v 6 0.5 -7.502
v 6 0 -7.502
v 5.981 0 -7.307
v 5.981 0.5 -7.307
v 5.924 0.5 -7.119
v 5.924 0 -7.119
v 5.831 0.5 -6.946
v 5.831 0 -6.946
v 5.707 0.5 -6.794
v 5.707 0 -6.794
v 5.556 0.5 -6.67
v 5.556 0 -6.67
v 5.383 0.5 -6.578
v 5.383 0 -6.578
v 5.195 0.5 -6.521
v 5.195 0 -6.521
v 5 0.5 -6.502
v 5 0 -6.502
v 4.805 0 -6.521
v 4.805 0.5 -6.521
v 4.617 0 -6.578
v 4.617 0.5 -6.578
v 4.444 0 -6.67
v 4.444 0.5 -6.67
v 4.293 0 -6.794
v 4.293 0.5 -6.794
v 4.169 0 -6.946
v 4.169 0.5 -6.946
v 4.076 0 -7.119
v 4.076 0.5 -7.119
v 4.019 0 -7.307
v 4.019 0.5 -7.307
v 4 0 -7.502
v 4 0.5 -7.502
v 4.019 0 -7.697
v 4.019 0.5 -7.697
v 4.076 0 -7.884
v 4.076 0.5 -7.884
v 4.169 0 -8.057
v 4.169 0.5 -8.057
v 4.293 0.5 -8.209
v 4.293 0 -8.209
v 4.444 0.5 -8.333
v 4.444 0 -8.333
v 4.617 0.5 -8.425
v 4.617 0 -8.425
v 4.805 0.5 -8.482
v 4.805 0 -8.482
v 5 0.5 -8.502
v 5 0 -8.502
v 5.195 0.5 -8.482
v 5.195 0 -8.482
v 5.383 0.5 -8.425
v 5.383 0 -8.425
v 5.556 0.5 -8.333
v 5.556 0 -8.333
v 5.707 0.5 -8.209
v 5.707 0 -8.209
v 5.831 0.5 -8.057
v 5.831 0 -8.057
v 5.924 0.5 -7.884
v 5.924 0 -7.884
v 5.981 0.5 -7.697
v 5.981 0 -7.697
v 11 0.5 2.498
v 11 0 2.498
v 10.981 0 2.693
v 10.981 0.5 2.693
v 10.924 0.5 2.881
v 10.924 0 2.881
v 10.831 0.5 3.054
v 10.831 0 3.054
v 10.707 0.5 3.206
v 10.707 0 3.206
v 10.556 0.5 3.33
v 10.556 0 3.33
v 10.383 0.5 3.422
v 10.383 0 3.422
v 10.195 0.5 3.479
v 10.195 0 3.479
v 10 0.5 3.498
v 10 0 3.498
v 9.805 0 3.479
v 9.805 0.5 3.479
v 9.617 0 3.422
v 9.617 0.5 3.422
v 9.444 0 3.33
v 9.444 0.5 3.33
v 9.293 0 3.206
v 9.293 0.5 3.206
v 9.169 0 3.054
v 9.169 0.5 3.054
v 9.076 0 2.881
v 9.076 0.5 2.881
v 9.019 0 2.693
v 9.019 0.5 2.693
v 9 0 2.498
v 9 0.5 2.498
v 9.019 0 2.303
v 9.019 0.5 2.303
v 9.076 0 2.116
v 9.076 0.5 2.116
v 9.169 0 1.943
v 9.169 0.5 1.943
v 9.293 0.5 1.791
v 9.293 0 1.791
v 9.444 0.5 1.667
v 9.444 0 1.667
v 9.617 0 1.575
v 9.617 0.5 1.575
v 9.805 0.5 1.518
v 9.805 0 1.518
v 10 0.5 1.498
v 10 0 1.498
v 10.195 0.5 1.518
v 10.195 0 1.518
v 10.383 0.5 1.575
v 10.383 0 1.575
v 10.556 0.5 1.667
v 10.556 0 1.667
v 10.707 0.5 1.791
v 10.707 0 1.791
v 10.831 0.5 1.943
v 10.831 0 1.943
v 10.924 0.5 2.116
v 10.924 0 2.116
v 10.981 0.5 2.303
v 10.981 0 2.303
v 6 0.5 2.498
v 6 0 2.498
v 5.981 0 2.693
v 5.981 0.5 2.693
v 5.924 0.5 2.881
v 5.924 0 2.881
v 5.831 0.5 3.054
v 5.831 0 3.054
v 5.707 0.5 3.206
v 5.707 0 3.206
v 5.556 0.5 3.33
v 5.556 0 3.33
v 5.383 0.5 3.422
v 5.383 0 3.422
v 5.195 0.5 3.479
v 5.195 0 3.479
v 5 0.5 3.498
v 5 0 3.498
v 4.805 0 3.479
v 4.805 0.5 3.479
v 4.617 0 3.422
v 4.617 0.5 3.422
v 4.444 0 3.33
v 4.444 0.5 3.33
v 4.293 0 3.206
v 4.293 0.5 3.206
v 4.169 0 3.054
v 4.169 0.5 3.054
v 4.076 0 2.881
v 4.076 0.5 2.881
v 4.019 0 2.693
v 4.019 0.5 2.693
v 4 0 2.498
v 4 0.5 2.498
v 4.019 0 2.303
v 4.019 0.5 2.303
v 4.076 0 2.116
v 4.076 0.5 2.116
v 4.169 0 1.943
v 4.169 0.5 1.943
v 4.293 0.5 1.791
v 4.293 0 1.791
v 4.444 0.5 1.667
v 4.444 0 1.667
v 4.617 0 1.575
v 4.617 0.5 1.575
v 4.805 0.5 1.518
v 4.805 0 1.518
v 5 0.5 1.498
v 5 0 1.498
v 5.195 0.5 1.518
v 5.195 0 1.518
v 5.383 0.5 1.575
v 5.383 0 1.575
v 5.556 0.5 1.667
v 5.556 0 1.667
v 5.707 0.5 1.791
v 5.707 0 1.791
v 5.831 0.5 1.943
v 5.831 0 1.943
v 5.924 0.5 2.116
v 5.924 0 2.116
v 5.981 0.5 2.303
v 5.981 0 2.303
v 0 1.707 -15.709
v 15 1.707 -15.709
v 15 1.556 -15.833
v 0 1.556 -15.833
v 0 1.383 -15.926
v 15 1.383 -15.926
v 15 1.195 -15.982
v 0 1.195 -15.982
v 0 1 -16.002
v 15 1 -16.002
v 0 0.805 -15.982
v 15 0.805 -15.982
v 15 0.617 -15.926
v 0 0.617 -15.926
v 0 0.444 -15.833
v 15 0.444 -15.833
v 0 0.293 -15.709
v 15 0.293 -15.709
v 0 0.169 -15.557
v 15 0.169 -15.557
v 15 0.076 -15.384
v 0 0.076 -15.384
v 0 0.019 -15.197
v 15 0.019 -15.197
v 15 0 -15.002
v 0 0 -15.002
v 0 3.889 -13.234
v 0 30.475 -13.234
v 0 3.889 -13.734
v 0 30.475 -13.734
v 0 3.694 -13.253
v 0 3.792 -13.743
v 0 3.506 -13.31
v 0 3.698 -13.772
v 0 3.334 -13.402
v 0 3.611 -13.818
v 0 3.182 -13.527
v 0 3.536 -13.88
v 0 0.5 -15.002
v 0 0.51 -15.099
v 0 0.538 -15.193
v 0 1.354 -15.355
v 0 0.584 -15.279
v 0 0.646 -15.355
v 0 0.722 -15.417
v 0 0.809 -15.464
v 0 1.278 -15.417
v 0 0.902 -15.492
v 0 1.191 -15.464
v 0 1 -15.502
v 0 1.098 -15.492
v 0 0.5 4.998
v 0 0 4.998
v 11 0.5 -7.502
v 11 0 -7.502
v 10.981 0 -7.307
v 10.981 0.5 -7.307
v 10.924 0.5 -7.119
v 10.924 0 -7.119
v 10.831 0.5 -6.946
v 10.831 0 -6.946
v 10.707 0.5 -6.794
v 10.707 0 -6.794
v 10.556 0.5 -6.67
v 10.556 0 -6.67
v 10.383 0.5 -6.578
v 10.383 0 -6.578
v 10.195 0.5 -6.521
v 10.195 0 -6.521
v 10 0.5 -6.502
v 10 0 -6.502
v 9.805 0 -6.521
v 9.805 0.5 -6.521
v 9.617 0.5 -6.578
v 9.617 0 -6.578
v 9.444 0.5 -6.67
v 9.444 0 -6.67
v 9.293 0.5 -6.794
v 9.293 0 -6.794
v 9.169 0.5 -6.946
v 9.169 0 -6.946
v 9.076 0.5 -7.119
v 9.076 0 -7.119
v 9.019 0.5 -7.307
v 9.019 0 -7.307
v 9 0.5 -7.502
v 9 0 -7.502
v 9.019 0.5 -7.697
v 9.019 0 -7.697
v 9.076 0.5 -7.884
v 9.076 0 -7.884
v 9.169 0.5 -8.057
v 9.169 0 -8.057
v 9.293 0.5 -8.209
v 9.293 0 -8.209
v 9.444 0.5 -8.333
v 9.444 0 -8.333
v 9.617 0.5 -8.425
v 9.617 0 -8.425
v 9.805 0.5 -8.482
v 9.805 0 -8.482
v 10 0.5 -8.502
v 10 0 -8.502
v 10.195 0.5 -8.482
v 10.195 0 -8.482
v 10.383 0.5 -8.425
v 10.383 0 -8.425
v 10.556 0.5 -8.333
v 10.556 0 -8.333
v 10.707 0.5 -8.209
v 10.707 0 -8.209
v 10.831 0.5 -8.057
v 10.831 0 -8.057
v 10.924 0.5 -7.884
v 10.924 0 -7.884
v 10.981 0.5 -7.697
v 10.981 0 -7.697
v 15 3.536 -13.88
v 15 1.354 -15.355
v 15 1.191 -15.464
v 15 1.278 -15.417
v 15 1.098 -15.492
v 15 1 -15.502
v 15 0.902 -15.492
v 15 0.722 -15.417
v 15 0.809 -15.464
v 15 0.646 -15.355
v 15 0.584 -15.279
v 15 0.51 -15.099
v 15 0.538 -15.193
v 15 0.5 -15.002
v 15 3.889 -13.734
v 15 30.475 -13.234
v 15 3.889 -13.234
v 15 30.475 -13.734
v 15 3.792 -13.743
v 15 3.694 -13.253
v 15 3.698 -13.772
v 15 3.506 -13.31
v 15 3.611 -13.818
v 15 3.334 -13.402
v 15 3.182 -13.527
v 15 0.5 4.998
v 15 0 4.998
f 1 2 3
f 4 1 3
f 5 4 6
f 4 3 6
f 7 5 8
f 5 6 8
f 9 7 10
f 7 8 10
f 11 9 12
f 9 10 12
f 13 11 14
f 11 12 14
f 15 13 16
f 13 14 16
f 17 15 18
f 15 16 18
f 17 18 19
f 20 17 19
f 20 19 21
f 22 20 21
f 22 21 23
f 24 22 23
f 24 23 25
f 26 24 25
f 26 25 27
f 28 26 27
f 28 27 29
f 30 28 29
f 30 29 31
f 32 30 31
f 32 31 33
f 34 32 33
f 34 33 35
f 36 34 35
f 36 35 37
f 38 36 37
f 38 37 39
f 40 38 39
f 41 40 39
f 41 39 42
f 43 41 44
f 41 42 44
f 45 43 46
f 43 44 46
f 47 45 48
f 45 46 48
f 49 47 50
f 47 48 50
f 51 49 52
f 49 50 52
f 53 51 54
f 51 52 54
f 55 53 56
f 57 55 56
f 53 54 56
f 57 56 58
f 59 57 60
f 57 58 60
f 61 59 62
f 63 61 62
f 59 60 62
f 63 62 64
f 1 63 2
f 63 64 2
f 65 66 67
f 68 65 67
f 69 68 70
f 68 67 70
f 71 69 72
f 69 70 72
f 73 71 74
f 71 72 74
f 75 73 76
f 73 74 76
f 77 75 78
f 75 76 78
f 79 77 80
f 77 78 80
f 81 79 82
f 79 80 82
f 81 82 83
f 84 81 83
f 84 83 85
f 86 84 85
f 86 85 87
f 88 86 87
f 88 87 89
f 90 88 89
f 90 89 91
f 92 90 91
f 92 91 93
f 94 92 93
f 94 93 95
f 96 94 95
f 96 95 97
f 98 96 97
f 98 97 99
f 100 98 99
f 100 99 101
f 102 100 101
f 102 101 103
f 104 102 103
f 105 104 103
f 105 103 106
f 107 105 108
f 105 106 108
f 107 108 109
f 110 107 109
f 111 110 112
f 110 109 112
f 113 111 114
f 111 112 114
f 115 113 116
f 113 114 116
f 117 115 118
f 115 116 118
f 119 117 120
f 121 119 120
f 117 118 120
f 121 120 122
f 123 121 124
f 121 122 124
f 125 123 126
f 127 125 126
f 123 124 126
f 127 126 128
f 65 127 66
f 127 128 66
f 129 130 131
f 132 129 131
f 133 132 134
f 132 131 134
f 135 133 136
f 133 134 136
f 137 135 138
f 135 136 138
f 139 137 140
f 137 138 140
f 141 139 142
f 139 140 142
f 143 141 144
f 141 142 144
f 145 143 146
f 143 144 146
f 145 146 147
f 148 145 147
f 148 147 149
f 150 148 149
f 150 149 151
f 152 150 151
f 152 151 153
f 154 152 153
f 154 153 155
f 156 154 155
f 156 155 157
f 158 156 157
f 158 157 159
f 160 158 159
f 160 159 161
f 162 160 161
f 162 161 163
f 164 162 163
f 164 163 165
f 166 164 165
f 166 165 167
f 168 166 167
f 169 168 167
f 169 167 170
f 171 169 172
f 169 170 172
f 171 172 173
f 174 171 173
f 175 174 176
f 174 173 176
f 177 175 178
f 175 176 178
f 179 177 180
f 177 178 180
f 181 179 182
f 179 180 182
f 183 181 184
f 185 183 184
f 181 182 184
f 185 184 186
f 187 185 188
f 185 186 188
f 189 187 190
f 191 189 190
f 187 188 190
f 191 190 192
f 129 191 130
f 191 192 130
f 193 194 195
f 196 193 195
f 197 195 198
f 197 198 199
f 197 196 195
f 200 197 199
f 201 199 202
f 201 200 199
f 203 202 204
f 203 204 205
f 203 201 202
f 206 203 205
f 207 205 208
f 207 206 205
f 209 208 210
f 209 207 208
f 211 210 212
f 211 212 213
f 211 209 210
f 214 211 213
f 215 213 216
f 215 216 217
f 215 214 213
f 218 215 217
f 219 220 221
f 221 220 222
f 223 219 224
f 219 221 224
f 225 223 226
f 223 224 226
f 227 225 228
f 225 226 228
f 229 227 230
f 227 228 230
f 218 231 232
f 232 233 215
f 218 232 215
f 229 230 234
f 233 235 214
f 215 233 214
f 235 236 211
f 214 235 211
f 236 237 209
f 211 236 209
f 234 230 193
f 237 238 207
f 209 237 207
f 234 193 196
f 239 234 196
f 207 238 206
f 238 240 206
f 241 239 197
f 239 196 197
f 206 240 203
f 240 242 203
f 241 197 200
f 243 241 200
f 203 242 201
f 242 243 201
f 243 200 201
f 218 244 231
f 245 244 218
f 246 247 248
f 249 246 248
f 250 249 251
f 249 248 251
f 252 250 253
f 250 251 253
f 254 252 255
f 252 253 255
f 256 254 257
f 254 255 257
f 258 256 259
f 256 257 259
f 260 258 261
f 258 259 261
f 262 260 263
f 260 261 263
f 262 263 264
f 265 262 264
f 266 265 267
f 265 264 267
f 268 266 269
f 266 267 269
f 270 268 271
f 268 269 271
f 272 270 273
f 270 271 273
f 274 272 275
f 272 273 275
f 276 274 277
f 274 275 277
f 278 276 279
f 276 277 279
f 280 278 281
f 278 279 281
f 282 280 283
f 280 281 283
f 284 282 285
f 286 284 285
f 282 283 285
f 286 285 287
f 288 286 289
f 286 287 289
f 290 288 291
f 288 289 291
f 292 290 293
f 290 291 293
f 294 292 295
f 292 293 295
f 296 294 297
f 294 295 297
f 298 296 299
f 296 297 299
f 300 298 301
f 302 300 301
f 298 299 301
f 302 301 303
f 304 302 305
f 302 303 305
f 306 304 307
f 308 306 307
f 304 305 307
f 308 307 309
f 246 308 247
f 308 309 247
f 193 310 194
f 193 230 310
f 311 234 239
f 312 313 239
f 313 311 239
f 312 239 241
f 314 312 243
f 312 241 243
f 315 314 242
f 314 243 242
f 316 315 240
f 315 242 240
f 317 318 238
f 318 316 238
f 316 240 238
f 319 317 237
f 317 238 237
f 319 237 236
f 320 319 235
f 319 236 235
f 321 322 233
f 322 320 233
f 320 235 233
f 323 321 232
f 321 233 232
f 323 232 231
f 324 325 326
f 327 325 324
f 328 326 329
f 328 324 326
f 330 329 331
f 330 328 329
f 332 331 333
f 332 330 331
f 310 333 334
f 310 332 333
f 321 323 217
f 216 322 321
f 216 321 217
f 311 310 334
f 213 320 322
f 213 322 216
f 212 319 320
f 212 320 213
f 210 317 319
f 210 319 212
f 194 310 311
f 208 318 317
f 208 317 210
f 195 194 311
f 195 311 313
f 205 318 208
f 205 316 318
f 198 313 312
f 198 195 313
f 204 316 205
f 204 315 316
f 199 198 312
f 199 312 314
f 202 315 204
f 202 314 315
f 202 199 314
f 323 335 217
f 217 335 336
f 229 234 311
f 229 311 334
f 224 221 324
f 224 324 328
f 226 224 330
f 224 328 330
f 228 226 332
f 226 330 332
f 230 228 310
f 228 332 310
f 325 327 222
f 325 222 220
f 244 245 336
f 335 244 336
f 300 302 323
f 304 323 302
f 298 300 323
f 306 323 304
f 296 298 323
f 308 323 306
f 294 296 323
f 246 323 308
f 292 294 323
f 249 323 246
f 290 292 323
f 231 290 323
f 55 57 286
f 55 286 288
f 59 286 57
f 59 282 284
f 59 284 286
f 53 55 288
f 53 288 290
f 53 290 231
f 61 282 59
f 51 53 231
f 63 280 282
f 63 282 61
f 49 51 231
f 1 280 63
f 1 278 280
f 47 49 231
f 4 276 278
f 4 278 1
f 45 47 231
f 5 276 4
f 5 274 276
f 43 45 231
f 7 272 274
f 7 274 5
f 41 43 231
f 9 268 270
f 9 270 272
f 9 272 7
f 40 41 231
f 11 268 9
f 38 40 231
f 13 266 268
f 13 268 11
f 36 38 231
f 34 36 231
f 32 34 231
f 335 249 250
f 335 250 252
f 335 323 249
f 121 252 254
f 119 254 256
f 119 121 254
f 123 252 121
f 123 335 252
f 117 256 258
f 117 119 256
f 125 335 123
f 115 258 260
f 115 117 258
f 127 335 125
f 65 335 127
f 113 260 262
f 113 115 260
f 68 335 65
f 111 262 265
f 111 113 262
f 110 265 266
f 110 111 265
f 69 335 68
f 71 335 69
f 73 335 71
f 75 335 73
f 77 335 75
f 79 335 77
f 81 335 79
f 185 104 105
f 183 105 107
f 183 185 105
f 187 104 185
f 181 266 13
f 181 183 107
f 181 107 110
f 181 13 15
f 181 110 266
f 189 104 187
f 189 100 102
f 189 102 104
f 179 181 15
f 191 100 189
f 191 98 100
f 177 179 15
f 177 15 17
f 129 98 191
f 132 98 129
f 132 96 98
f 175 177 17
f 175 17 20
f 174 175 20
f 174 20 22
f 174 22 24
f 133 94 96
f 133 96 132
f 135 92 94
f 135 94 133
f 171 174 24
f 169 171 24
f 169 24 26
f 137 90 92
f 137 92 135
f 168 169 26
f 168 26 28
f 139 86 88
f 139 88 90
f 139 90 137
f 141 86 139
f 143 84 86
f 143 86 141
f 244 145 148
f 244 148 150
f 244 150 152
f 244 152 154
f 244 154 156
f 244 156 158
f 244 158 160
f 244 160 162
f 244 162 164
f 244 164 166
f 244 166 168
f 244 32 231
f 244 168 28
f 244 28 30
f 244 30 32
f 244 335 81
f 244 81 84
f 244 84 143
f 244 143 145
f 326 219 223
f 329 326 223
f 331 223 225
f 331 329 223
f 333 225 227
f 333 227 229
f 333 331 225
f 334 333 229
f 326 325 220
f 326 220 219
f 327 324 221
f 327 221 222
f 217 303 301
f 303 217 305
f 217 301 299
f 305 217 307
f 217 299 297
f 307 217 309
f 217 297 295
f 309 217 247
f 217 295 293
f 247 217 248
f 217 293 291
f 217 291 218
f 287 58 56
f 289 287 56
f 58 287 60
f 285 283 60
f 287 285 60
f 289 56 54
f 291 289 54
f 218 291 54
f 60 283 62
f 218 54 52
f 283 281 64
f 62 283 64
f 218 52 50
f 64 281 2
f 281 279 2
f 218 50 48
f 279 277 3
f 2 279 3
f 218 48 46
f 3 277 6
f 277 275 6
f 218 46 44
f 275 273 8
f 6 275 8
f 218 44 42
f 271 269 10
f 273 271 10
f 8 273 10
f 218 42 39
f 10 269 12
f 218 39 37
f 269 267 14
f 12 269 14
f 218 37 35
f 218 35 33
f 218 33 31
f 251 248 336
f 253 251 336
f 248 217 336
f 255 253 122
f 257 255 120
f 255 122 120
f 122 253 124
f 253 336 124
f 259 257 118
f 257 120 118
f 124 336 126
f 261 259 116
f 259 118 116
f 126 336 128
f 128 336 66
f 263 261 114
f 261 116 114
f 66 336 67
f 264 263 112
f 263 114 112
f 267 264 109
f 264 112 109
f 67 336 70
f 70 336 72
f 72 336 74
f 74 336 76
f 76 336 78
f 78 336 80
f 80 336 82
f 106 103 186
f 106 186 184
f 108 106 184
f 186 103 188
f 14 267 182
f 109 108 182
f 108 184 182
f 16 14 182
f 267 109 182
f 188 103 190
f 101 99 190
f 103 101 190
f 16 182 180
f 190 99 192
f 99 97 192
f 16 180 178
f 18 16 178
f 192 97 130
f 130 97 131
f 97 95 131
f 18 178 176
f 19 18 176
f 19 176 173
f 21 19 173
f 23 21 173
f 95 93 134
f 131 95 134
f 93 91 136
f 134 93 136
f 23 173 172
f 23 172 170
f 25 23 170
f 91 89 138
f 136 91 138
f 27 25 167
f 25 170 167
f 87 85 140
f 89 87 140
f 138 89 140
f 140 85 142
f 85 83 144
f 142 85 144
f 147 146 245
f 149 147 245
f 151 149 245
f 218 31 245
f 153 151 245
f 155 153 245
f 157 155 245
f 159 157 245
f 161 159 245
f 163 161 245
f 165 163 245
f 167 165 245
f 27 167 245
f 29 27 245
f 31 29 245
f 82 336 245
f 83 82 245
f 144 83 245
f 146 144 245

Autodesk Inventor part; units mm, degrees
ref_plane "YZ Plane" through (0, 0, 0) normal (1, 0, 0) x (0, 1, 0)
ref_plane "XZ Plane" through (0, 0, 0) normal (0, 1, 0) x (-1, 0, 0)
ref_plane "XY Plane" through (0, 0, 0) normal (0, 0, 1) x (1, 0, 0)
sketch "Sketch1" plane through (0, 0, 0) normal (0, 1, 0) x (-1, 0, 0)
  line L0 (0, 4.9984) -> (-15, 4.9984)
  line L1 (-15, 4.9984) -> (-15, -15.0016)
  line L2 (-15, -15.0016) -> (0, -15.0016)
  line L3 (0, -15.0016) -> (0, 4.9984)
  dimension "d0" = 15
  dimension "d1" = 20
extrude "Plate1" add sketch "Sketch1" along normal blind 0.5
sketch "Sketch2" plane through (0, 1.3536, -15.3552) normal (0, 0.7071068, -0.7071068) x (-1, 0, 0)
  line L0 (-15, 0) -> (0, 0)
  line L1 (0, 0) -> (0, 2.5858)
  line L2 (0, 2.5858) -> (-15, 2.5858)
  line L3 (-15, 2.5858) -> (-15, 0)
edge flange "Flange1" height 5 angle 135 thickness 0.5 bend radius 0.5 thickness toward (0, 0.7071068, -0.7071068) relief tear relief width 0.5 relief depth 0.25 edges at (7.5, 0.5, -15.0016) wall of the first edge with corners at (15, 1.3536, -15.3552) (0, 1.3536, -15.3552) (0, 3.182, -13.5267) (15, 3.182, -13.5267)
bend "Bend1"
corner "Corner1"
sketch "Sketch3" plane through (15, 3.8891, -13.7338) normal (0, 0, 1) x (1, 0, 0)
  line L0 (-15, 0) -> (0, 0)
  line L1 (0, 0) -> (0, 26.5858)
  line L2 (0, 26.5858) -> (-15, 26.5858)
  line L3 (-15, 26.5858) -> (-15, 0)
edge flange "Flange2" height 27 angle 45 thickness 0.5 bend radius 0.5 thickness toward (0, 0, 1) relief tear relief width 0.5 relief depth 0.25 edges at (7.5, 3.5355, -13.8803) wall of the first edge with corners at (0, 3.8891, -13.7338) (15, 3.8891, -13.7338) (15, 30.4749, -13.7338) (0, 30.4749, -13.7338)
bend "Bend2"
corner "Corner2"
sketch "Sketch4" plane through (0, 0, 0) normal (0, -1, 0) x (1, 0, 0)
  circle A0 centre (10, 2.4984) radius 1 projected
  circle A1 centre (5, 2.4984) radius 1 projected
  circle A2 centre (5, -7.5016) radius 1 projected
  circle A3 centre (10, -7.5016) radius 1 projected
  point P0 (0, 0)
extrude "Extrusion1" cut sketch "Sketch4" against normal blind 10
equation "\"d2\" = Thickness"
equation "\"d3\" = BendReliefWidth"
equation "\"d4\" = BendReliefDepth"
equation "\"d5\" = MinimumRemnant"
equation "\"d6\" = TransitionRadius"
equation "\"d9\" = BendRadius"
equation "\"d10\" = CornerReliefSize"
equation "\"d11\" = GapSize"
equation "\"d12\" = JacobiRadiusSize"
equation "\"d13\" = BendReliefWidth"
equation "\"d14\" = BendReliefDepth"
equation "\"d15\" = MinimumRemnant"
equation "\"d16\" = TransitionRadius"
equation "\"d19\" = BendRadius"
equation "\"d20\" = CornerReliefSize"
equation "\"d21\" = GapSize"
equation "\"d22\" = JacobiRadiusSize"
equation "\"BendRadius\" = Thickness"
equation "\"BendReliefWidth\" = Thickness"
equation "\"BendReliefDepth\" = 0.5 * Thickness"
equation "\"CornerReliefSize\" = 4 * Thickness"
equation "\"MinimumRemnant\" = 2 * Thickness"
equation "\"TransitionRadius\" = BendRadius"
equation "\"JacobiRadiusSize\" = BendRadius"
equation "\"GapSize\" = Thickness"
equation "\"Thickness\" = 0.5"
properties part number "LaminaResorte" material "Stainless Steel"
